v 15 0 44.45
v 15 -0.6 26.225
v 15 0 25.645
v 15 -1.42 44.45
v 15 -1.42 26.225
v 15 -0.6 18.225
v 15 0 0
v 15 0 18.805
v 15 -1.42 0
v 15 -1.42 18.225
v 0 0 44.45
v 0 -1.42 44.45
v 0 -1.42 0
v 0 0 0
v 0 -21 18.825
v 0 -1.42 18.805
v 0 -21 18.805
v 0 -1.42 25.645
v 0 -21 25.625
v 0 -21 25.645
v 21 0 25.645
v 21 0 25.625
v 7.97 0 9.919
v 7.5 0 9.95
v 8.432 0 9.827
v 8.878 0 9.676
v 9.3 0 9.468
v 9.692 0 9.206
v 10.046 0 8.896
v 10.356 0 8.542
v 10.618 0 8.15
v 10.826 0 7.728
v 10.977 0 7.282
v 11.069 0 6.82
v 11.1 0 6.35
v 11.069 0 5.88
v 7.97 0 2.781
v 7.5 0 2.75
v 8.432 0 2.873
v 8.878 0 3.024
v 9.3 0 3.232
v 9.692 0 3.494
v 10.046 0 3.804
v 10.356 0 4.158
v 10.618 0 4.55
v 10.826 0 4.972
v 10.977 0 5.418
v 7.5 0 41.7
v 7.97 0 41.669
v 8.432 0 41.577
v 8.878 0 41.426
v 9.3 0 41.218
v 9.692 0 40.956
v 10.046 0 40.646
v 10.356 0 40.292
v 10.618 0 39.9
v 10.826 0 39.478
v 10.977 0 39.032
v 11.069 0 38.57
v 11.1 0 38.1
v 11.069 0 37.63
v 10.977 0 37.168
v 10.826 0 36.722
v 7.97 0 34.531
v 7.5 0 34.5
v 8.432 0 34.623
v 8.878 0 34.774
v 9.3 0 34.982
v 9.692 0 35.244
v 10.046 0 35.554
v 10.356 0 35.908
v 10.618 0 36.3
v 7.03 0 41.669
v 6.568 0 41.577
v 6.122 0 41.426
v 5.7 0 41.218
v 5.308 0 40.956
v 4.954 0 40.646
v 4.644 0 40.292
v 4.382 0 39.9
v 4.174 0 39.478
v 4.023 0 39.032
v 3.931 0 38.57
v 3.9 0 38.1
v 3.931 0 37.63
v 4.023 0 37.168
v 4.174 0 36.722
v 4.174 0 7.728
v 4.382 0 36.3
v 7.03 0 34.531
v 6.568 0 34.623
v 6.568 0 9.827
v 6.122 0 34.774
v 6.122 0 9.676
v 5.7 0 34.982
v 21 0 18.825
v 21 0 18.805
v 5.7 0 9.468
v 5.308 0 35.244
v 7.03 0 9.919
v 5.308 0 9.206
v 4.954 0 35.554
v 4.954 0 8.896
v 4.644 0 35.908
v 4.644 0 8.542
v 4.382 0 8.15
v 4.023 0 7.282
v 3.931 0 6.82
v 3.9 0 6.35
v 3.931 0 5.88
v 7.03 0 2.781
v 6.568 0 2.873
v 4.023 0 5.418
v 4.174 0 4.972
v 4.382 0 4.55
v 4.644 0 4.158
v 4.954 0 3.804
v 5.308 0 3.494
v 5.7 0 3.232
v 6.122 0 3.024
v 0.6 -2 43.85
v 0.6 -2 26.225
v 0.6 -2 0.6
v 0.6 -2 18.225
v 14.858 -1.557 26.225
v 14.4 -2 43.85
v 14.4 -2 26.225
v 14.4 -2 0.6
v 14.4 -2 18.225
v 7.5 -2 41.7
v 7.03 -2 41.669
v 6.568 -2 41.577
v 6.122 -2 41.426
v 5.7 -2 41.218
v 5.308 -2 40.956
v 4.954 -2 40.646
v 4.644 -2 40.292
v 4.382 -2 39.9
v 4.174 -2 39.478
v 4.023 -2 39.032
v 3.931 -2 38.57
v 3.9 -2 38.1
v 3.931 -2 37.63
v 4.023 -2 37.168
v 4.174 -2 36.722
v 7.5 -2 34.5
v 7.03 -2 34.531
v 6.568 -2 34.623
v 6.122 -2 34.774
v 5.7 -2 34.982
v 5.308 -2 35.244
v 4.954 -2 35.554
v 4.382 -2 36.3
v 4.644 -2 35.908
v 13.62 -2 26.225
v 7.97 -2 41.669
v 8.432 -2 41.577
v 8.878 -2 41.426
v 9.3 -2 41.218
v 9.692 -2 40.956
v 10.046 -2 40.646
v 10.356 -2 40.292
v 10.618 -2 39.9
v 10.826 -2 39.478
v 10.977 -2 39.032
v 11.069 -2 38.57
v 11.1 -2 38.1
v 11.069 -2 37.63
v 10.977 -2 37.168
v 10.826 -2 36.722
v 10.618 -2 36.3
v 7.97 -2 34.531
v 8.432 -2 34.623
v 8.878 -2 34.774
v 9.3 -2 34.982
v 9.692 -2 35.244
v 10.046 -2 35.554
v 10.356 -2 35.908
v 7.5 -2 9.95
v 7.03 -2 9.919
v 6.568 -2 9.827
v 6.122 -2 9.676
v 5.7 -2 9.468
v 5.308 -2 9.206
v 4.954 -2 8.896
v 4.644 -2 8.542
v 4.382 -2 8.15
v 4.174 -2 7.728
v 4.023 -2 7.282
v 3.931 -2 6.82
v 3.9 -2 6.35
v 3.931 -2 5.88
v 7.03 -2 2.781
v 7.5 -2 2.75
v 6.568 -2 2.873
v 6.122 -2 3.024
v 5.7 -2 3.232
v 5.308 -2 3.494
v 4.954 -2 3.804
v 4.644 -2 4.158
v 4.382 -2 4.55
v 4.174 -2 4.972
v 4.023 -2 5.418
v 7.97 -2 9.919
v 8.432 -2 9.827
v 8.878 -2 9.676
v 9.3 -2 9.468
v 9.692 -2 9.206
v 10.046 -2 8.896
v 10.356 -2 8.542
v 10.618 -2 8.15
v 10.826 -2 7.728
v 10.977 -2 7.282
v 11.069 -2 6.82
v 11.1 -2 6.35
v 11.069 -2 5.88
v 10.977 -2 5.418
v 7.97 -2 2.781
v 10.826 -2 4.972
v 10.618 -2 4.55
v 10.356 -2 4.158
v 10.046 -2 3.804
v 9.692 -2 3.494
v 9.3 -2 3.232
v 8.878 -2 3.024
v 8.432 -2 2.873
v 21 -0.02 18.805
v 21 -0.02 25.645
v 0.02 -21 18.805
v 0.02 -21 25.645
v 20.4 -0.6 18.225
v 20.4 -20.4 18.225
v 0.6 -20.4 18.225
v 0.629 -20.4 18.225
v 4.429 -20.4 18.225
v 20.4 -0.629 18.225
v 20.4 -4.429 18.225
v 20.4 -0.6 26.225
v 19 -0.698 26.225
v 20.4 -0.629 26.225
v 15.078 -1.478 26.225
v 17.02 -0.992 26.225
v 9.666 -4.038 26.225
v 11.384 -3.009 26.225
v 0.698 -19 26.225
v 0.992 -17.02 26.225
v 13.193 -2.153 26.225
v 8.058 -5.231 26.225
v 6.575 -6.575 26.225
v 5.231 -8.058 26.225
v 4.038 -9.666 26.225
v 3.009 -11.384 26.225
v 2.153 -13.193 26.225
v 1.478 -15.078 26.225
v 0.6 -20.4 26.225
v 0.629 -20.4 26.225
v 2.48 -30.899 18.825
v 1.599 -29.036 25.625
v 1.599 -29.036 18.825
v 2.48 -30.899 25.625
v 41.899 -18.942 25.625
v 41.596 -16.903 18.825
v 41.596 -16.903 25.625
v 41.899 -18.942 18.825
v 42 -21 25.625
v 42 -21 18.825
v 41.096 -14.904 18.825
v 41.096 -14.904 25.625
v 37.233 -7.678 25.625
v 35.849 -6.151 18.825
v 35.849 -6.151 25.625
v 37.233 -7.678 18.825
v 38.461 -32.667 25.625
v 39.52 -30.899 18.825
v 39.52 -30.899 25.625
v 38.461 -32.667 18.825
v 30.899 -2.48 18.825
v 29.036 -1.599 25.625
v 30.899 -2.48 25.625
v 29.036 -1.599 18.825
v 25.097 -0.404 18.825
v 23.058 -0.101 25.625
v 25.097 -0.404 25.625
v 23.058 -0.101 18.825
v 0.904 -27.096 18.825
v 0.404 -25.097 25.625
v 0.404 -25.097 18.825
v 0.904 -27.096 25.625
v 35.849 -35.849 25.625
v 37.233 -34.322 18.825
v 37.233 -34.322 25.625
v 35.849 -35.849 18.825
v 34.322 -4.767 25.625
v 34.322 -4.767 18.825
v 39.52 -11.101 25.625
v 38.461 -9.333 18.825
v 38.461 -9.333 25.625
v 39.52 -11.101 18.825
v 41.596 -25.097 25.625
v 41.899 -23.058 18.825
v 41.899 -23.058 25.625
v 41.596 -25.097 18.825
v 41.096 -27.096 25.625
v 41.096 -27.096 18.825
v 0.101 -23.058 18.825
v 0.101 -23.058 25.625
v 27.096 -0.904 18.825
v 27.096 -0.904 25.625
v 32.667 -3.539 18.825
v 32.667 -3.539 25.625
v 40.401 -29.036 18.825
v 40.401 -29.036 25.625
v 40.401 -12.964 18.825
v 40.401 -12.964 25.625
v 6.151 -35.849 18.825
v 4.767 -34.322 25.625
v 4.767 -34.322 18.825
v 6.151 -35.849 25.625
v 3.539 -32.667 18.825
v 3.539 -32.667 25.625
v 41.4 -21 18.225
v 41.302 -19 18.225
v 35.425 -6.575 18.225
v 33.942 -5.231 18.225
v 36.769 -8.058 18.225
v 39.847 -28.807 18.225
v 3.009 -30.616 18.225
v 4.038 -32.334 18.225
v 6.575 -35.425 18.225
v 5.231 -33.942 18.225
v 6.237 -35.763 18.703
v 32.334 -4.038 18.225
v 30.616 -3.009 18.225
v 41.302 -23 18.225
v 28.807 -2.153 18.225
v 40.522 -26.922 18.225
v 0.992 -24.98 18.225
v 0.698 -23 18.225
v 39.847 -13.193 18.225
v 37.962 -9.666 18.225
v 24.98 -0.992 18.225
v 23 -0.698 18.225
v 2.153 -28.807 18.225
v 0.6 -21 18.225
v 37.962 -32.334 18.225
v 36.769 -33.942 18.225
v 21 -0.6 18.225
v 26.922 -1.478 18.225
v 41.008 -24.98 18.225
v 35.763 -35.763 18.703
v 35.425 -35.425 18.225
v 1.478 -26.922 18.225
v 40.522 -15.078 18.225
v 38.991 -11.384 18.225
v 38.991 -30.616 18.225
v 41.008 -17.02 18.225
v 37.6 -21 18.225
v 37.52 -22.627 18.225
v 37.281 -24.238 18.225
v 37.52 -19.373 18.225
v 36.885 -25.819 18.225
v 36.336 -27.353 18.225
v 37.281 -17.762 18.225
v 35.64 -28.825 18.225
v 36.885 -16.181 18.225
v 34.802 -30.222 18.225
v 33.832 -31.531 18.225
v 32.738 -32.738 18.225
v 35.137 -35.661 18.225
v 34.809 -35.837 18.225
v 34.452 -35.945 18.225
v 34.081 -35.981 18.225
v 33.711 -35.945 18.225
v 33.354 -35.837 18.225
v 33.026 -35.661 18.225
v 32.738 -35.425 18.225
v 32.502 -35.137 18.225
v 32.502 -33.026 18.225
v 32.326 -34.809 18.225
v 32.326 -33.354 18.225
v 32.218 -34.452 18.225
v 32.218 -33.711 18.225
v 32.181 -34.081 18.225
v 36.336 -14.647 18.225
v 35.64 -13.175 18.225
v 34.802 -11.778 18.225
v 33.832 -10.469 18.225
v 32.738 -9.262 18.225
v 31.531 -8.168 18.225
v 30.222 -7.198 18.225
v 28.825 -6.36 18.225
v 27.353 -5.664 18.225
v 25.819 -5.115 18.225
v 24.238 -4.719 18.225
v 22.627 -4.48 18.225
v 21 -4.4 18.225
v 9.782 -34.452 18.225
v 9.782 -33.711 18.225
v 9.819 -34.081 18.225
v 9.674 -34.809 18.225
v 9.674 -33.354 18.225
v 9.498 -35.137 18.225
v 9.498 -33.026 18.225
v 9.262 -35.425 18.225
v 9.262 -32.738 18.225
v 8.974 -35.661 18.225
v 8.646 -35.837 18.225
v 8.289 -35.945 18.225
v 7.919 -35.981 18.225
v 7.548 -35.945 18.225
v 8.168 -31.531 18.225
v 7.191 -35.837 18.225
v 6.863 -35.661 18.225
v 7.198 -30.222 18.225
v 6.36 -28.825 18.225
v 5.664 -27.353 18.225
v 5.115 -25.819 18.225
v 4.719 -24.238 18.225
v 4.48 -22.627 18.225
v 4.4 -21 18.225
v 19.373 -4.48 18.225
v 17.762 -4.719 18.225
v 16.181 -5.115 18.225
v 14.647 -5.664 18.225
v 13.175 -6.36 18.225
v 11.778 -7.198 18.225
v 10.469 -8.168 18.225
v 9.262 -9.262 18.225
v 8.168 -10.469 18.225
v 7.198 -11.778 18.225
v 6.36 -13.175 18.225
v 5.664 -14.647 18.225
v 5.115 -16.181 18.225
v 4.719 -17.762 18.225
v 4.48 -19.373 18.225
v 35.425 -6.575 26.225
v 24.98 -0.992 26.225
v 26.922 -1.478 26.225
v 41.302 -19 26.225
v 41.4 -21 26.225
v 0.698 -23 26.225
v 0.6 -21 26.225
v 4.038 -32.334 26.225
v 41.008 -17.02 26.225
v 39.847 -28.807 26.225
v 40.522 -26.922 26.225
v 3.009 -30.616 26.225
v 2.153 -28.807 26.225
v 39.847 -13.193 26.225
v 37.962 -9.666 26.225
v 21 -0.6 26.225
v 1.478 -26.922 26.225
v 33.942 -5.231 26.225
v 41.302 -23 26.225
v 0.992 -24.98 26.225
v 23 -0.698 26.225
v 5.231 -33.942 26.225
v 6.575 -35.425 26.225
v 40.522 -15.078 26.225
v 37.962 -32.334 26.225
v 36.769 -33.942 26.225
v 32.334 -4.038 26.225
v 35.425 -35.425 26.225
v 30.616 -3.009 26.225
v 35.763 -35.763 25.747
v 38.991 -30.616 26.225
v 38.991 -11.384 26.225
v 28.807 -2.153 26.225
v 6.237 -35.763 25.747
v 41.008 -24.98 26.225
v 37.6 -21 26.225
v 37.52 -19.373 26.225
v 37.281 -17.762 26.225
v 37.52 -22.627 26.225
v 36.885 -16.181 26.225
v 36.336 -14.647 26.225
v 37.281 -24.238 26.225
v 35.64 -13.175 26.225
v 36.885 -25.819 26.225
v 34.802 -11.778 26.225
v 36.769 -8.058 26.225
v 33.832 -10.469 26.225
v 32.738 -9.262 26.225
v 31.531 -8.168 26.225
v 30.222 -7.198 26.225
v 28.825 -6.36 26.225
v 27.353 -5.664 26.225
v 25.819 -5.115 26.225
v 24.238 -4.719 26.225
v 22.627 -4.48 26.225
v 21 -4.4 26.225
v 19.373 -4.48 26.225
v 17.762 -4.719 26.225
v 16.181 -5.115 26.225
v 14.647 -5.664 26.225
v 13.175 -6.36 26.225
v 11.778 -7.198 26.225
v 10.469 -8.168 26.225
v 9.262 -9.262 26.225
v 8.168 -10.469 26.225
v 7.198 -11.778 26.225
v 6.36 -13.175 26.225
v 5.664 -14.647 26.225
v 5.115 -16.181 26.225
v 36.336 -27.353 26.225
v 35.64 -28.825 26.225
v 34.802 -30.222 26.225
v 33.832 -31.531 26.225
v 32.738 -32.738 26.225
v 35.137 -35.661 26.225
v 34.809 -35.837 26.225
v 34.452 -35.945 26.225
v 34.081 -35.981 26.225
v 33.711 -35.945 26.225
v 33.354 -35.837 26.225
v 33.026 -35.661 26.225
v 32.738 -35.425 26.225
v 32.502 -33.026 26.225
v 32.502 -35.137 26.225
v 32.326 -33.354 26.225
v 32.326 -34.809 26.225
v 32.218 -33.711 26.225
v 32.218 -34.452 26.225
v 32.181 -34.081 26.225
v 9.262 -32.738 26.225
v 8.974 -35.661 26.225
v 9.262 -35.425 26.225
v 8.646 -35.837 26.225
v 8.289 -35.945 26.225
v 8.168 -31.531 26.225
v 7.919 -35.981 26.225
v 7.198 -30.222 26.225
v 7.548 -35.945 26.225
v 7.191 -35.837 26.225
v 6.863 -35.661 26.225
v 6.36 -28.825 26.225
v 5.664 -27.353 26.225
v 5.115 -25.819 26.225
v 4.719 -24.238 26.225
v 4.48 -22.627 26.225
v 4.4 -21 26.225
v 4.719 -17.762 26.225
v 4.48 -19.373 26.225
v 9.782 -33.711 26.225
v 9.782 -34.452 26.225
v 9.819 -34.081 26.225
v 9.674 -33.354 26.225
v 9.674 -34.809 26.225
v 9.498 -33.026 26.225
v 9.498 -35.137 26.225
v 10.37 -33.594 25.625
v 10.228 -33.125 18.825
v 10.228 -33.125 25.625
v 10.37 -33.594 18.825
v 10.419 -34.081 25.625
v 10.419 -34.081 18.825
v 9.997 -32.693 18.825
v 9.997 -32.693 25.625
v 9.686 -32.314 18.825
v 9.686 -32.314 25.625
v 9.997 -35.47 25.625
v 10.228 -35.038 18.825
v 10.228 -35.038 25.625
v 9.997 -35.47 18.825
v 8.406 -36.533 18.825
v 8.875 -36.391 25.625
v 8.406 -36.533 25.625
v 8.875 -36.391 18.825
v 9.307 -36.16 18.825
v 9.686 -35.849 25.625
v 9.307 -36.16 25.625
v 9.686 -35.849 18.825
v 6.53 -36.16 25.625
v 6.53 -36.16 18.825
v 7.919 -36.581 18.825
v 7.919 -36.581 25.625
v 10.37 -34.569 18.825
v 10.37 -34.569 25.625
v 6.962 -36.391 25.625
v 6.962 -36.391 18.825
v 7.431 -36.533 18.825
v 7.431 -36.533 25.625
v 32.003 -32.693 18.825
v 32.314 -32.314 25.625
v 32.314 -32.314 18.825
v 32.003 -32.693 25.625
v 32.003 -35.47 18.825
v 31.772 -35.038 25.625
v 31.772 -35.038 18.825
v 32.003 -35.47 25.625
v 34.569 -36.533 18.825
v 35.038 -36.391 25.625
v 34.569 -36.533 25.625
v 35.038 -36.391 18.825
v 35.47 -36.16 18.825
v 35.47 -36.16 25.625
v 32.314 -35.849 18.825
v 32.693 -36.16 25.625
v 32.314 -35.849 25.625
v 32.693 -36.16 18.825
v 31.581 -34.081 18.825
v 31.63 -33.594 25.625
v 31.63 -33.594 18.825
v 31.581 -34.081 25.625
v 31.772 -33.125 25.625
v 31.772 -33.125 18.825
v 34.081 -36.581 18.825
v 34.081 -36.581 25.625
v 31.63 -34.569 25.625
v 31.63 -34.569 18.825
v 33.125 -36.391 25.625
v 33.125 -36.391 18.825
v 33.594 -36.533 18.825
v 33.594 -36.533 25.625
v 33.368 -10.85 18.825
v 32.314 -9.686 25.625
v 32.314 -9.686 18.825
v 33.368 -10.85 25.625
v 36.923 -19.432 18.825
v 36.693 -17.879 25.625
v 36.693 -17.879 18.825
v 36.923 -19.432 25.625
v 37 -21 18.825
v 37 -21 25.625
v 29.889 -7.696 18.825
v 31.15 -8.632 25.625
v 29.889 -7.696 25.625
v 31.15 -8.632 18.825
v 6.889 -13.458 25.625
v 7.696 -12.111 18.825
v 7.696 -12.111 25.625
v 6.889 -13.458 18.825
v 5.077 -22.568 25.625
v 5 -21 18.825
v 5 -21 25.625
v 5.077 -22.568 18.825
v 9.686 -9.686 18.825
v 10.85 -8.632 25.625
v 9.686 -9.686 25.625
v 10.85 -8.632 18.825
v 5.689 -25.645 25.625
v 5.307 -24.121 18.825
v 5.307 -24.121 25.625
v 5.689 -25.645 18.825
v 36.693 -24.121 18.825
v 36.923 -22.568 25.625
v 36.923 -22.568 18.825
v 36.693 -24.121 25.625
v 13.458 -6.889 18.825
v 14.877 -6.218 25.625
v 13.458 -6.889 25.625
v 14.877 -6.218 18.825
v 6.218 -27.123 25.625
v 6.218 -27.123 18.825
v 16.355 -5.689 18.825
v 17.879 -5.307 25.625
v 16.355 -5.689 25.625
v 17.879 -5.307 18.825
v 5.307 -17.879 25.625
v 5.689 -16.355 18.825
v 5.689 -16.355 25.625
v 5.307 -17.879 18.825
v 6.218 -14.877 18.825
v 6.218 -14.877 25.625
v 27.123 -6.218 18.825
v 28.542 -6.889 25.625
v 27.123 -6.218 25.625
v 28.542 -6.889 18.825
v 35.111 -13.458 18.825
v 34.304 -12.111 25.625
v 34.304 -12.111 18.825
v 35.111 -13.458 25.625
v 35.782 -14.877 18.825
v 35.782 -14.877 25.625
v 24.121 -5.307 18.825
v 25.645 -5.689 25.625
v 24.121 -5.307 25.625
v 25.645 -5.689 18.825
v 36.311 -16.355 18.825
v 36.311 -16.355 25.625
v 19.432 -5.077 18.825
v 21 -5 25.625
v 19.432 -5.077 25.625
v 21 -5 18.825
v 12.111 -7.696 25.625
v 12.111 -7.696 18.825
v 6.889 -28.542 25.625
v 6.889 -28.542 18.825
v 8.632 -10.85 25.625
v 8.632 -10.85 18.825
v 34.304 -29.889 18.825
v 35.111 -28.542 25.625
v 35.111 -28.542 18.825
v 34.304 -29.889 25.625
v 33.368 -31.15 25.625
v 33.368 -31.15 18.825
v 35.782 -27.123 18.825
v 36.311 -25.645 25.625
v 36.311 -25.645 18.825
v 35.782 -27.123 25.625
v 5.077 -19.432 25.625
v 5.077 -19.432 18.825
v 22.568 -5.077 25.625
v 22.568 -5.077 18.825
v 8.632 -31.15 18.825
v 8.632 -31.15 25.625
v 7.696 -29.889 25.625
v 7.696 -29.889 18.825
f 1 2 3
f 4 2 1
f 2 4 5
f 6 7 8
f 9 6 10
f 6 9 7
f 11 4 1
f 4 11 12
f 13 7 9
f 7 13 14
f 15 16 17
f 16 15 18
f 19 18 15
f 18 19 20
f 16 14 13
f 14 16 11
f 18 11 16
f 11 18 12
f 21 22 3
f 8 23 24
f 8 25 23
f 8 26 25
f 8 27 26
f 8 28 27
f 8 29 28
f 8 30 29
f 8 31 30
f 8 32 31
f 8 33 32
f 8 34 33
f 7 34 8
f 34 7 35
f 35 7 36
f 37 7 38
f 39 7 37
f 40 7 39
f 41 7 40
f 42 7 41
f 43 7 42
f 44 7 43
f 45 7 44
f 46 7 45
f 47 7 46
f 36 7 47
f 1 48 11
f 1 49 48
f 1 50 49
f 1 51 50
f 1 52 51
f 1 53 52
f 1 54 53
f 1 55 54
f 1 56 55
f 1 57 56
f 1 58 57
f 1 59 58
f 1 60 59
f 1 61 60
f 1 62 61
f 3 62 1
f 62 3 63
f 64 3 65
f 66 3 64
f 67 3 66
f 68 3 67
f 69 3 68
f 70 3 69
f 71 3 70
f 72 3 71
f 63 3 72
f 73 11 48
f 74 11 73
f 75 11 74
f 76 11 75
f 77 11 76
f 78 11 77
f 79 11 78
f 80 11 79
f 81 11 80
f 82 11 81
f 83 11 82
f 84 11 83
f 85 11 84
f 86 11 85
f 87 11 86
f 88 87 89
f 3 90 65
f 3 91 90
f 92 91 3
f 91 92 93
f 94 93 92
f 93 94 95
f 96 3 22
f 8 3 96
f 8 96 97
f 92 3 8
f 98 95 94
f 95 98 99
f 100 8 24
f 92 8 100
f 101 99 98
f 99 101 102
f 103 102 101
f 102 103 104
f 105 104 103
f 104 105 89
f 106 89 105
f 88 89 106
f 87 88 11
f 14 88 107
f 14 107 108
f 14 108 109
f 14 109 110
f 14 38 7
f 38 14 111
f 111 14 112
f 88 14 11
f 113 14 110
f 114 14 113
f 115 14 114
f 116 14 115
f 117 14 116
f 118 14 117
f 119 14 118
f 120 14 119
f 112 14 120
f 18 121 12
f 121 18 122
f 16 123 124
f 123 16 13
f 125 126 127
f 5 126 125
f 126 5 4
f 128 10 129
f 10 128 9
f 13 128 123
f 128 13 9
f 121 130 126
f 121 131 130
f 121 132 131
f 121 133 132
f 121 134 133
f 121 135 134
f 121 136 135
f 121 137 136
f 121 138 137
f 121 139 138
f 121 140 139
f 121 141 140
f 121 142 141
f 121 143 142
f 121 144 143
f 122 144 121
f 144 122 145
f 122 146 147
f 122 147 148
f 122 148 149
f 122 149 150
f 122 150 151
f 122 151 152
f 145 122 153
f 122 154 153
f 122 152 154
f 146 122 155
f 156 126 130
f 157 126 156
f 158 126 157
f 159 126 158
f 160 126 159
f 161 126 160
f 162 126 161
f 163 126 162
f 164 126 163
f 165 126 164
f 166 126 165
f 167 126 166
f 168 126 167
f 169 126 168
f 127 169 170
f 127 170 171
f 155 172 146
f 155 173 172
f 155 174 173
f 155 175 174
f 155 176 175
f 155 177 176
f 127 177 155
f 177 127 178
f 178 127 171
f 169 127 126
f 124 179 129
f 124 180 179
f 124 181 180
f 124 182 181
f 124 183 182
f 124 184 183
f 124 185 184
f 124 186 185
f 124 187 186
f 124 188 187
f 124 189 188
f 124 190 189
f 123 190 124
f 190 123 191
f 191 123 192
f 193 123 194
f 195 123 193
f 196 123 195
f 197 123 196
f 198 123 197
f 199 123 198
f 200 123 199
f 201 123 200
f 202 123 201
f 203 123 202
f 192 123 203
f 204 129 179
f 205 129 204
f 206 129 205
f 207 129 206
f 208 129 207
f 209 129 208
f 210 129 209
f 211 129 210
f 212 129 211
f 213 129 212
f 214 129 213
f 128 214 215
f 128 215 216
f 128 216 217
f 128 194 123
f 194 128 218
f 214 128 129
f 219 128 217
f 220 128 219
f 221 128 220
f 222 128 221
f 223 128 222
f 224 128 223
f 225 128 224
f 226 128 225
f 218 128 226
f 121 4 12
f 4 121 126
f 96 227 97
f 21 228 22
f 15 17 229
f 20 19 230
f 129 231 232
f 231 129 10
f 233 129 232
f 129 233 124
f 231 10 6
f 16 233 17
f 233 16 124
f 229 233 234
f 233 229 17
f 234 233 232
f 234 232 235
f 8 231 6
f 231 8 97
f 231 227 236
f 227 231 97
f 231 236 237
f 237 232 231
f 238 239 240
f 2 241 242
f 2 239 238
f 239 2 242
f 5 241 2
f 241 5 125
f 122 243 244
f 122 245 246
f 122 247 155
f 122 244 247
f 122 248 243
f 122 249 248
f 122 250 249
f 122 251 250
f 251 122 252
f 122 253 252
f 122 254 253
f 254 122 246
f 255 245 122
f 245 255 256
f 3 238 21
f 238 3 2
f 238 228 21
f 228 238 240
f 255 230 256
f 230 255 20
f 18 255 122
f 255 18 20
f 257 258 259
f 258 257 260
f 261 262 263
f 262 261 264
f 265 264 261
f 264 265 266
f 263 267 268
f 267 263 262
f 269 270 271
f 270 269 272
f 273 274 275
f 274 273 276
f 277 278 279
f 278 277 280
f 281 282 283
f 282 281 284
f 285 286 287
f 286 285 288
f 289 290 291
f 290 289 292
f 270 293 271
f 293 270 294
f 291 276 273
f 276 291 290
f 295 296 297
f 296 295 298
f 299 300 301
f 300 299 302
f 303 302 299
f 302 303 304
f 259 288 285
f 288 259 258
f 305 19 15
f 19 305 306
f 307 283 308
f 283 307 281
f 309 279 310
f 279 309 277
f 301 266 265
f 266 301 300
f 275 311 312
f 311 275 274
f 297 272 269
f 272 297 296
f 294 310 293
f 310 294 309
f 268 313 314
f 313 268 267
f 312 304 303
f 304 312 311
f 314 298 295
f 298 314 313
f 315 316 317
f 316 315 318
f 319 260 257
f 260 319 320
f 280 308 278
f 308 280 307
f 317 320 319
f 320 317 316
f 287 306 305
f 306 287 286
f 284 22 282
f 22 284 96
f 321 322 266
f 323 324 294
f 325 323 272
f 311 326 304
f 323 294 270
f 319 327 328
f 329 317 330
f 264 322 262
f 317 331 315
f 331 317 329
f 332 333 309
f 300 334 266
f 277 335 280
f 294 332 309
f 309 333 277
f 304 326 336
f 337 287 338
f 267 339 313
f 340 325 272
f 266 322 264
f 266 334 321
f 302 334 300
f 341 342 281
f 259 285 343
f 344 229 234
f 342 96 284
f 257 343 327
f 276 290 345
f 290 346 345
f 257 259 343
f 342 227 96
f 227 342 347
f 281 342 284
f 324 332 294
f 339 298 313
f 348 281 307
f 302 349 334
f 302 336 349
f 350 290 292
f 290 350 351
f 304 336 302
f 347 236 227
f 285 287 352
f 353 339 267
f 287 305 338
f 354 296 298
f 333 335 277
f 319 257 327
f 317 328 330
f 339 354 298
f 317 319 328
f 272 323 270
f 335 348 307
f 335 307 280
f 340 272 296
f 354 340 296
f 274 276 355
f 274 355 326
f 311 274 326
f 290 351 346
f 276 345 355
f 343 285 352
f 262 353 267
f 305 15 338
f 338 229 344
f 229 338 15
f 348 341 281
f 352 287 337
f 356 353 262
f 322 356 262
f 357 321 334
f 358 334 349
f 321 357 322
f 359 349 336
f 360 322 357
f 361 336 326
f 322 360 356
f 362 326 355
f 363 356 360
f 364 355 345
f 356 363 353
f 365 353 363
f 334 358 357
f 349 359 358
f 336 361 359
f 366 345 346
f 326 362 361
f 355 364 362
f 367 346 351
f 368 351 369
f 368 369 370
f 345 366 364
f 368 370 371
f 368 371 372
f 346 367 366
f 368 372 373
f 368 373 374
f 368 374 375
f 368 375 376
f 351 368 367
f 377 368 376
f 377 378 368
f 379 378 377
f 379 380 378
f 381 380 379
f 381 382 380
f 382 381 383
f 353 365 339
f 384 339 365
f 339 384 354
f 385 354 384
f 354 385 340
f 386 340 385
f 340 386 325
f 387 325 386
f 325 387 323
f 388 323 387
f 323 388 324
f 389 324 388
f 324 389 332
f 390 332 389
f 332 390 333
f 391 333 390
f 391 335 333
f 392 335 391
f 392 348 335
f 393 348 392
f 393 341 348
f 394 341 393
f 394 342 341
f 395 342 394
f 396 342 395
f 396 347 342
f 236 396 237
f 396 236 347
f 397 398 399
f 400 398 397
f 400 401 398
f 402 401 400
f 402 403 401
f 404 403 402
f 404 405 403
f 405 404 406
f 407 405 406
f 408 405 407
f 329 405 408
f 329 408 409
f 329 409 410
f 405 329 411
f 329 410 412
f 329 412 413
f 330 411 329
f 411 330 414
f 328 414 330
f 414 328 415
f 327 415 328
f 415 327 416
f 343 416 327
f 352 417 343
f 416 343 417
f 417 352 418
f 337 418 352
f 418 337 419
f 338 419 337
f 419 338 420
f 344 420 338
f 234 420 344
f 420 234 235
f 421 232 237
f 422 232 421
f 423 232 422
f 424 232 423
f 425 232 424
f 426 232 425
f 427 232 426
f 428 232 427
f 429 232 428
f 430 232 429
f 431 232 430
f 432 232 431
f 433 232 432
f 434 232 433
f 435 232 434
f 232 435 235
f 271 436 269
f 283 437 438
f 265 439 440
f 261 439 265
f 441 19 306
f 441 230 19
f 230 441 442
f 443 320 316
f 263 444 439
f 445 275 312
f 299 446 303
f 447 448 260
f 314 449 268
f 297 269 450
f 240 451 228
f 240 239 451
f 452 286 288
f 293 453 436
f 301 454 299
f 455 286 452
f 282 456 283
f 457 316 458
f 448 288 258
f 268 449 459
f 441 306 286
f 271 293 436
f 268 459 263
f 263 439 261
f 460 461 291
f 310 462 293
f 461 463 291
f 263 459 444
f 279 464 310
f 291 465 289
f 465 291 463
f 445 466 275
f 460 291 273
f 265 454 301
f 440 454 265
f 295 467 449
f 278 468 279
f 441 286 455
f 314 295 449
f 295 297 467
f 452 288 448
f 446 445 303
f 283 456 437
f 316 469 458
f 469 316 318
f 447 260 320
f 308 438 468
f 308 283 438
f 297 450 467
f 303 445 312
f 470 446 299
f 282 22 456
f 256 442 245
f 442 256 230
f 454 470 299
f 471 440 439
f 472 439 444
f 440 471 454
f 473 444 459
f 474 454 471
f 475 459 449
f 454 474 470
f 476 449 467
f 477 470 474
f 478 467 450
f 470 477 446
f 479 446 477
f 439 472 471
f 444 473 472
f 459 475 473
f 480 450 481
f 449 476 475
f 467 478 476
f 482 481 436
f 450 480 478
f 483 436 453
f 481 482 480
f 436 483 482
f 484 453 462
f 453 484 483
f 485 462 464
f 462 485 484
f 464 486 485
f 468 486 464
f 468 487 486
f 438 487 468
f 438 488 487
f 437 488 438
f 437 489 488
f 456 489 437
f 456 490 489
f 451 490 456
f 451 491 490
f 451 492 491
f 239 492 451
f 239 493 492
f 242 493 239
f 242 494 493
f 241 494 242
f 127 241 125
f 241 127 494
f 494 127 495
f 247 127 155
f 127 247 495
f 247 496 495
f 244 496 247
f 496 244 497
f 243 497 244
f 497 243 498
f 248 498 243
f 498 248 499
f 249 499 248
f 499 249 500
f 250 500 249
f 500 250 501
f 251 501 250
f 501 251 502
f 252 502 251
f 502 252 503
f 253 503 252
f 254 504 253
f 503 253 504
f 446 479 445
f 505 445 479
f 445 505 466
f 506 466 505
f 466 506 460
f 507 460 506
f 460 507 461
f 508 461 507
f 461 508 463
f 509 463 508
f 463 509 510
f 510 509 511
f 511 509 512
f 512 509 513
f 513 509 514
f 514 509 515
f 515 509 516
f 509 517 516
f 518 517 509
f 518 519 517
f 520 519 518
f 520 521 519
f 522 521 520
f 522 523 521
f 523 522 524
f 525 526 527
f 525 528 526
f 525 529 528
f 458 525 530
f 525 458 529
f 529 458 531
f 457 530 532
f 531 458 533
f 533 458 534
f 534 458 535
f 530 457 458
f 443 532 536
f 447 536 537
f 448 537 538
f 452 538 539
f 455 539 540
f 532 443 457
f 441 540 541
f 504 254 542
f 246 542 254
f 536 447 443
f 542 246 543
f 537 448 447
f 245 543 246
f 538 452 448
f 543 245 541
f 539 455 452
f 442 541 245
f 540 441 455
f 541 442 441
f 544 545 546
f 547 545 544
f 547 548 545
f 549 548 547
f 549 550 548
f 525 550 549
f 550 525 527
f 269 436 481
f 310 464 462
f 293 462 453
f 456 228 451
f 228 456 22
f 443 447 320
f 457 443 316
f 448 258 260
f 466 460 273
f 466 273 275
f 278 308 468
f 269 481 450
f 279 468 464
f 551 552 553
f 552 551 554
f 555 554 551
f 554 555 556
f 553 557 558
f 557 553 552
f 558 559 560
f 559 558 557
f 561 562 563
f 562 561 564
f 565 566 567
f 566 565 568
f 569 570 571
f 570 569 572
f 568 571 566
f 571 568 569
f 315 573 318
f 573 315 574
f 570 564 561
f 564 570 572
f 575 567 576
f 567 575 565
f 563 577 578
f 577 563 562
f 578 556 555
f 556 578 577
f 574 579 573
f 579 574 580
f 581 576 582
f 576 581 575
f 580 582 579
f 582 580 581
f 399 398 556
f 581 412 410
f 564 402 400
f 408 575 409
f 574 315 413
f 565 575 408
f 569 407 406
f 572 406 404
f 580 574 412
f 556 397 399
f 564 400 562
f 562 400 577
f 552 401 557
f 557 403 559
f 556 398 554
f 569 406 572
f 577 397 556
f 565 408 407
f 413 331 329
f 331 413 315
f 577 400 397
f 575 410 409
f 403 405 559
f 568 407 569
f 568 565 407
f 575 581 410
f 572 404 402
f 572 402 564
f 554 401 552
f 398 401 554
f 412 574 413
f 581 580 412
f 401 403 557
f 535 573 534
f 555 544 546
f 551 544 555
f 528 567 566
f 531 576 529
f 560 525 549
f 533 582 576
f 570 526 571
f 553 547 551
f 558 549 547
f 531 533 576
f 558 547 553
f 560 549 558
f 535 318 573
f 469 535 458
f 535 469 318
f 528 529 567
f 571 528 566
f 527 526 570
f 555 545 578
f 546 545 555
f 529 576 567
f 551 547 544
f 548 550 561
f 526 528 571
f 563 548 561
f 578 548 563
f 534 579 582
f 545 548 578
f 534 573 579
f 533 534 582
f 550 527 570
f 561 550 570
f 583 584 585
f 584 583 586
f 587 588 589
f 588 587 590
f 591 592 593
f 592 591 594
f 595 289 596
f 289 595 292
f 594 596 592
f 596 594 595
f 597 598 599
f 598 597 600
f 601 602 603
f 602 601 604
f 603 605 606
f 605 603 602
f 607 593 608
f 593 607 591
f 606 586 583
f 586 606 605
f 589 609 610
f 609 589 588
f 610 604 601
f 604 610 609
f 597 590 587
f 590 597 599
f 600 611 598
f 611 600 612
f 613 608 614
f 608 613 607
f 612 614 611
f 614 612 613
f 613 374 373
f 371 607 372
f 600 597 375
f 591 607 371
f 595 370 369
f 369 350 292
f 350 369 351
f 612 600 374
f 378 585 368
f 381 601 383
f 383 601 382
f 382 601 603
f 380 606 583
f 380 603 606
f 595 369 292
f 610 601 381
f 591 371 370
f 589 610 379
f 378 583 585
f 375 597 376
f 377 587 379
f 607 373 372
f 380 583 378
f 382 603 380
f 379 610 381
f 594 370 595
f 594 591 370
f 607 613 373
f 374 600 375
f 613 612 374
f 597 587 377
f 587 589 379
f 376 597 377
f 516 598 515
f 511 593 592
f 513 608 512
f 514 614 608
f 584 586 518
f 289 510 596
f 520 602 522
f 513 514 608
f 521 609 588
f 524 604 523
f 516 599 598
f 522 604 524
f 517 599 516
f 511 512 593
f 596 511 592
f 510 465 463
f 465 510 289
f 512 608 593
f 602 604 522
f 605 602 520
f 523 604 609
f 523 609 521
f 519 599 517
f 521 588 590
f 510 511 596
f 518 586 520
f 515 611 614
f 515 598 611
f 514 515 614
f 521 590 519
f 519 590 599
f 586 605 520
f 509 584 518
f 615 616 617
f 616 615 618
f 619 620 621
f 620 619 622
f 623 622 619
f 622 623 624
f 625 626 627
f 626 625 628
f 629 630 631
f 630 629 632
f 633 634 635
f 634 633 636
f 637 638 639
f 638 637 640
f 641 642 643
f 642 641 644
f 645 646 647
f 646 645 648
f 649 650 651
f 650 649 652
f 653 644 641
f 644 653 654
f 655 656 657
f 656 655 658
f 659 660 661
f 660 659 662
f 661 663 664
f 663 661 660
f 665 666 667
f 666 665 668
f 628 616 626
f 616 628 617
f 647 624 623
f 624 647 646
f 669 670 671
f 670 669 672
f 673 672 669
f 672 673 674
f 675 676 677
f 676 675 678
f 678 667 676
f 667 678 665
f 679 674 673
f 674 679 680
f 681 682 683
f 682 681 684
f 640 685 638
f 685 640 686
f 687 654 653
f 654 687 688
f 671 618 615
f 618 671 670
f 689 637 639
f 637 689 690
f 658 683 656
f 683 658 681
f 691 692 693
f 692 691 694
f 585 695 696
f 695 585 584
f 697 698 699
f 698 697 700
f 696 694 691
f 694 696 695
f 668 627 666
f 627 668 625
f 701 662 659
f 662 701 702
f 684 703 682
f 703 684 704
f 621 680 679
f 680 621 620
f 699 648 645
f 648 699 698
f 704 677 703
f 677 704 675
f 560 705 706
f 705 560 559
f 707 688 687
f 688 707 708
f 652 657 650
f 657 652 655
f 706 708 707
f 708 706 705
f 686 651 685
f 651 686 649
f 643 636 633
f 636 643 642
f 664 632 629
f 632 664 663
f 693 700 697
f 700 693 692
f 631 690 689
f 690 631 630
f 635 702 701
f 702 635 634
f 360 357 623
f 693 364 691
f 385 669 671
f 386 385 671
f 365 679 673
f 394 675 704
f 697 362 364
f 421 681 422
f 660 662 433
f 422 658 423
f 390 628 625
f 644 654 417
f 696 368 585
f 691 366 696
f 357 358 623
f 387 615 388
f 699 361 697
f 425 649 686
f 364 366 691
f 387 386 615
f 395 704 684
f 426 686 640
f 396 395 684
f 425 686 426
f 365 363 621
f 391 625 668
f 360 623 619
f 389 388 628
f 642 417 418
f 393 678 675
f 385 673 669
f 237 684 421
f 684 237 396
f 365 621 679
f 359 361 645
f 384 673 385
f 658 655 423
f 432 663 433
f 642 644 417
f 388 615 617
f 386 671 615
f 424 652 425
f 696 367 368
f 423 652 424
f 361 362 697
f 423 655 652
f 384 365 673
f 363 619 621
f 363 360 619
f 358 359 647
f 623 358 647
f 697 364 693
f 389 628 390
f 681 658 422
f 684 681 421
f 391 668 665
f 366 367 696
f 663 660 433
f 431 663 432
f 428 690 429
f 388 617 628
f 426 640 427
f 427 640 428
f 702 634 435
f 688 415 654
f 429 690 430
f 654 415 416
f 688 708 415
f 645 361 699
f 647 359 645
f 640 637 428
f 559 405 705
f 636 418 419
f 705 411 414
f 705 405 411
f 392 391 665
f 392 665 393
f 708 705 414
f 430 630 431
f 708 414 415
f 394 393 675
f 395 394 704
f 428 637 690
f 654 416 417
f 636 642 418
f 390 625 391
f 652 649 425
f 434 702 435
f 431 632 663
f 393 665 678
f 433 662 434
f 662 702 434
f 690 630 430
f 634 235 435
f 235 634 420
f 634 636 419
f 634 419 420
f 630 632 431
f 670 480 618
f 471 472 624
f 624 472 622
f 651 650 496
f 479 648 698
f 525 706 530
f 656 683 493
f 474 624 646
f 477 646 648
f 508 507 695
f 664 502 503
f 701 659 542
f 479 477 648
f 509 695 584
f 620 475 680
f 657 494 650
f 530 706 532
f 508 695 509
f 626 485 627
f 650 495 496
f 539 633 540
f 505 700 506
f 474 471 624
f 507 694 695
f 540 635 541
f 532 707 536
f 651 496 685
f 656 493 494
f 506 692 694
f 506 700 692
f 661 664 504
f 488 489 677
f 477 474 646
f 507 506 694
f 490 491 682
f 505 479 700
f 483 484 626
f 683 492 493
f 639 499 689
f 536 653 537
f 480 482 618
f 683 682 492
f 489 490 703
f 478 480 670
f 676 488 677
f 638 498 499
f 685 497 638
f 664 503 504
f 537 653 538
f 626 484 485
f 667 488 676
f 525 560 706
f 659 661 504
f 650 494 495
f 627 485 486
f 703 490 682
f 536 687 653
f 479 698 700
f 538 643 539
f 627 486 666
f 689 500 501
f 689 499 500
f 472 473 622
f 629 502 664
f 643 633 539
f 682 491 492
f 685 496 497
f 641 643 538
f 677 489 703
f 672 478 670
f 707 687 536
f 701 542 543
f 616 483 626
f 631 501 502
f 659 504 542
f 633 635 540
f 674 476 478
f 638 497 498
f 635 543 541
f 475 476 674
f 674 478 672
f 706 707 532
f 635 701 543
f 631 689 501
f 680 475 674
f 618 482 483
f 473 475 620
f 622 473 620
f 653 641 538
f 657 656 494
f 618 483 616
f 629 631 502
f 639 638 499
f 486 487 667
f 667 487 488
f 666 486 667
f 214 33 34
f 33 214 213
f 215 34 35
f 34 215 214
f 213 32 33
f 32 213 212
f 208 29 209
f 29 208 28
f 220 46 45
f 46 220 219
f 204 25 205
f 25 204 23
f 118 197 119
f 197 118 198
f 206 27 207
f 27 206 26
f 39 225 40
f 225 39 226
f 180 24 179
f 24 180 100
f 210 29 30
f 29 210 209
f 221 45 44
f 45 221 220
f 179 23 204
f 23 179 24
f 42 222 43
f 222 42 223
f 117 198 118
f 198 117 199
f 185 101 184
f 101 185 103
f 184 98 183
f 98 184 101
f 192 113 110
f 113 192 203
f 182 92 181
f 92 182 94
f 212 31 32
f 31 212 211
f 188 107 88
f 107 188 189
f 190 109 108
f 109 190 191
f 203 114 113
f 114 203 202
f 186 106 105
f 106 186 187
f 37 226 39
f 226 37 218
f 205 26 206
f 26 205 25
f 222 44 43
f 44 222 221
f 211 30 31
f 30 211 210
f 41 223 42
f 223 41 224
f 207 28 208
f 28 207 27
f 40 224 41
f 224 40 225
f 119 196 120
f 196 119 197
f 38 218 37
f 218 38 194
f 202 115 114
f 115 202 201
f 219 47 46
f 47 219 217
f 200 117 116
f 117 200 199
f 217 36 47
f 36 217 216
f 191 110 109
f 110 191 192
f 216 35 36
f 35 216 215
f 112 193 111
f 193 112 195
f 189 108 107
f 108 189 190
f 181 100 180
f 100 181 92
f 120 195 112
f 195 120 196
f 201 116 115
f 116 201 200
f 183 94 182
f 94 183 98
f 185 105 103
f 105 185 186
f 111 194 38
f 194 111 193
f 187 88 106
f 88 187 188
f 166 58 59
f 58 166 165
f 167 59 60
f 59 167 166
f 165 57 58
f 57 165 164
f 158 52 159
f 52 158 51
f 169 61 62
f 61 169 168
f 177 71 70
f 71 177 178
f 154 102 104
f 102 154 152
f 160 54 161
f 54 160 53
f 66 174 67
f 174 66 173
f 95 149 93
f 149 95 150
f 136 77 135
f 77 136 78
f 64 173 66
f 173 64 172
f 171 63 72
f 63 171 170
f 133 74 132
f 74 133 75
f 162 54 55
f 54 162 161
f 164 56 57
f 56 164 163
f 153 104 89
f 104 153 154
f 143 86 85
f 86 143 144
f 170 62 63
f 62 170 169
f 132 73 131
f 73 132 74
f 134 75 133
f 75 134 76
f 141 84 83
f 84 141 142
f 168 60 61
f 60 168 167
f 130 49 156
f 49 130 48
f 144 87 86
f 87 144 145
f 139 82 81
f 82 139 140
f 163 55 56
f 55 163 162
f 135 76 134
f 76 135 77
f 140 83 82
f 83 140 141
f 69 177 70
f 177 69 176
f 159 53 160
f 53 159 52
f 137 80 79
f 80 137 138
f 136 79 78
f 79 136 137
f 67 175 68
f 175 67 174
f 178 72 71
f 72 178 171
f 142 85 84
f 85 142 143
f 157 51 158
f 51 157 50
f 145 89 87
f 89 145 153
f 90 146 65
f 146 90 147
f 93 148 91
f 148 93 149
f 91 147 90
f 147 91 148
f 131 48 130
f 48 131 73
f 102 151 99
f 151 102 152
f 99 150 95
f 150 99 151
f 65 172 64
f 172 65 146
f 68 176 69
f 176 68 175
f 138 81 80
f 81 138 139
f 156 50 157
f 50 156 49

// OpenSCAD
/**
 * Single-side 19" rack mounting plate: 1U tall, two holes (outer holes of the
 * standard EIA-310 three-hole group — middle hole omitted).
 *
 * Datum: plate bottom (Z = 0) aligns with the rack U boundary below this slot
 * (center of the 1/2" gap between hole groups). Plate top is the U boundary
 * above. Height and hole Z positions are fixed per EIA-310 (not parametric).
 * Plate width, thickness, hole size, and holder dimensions are parametric.
 *
 * Axes: X = along the ear (horizontal), Y = plate normal (Y = 0 is the outer stack
 *       plane; plate, tab, and ring lie in Y ≤ 0), Z = vertical (EIA rack height).
 *       X = 0 is the rail contact plane; geometry is symmetric in X (no handedness).
 *
 * Mic holder: hollow cylinder, axis +Z (vertical bore). Outer ring can have a wedge
 * removed (apex at holder centre, opening along −Y), with chamfered cylinders on the jaw
 * tips (tip Ø = half the outer−inner difference, i.e. radial wall). Bodies use
 * chamfered_cylinder (barrel h − 2×chamfer + end cones). Inner/outer are full Ø;
 * holder_thickness is the vertical grip length (Z). Ring lies in Y ≤ 0 (outer tangent
 * to Y = 0). Rail-side alignment: min X of ring and plate both at
 * X = 0. Z centered between the two rack mounting holes.
 *
 * Tab: square in XY (holder_outer_d/2 × holder_outer_d/2), Z = holder_thickness;
 * Y from −holder_outer_d/2 … 0 (face on Y = 0), anchored at X = 0. Unioned with the outer
 * ring; inner bore subtracted from that union.
 *
 * Plate chamfer: main slab shortened in Y by chamfer, then hull frustum unioned on the −Y
 * face (same pattern as tab / ring: thin body + added bevel solid).
 */

// --- Parametric (user) ---
plate_width = 15;       // mm, horizontal extent (single rail side)
plate_thickness = 2;    // mm
mounting_hole_d = 7.2;  // mm, typical for M6/cage-nut clearance (adjust to rail)
chamfer = 0.6;          // mm, 45° bevel on plate −Y face rim (see chamfer module)

// Mic grip (diameters = full Ø; thickness = vertical length along Z / bore axis)
holder_inner_d = 32;
holder_outer_d = 42;
holder_thickness = 8;
// Wedge removed from outer ring only: apex at holder centre, symmetric about −Y (full angle, deg).
mic_wedge_deg = 90;

// --- EIA-310 vertical: not parametric ---
// 1U = 1.75 in
function u_height_mm() = 44.45;
// Within one U, hole centers are 5/8" + 5/8" + 1/2" apart on center (bottom→top).
// U boundary lies in the middle of each 1/2" gap, so first and third hole centers
// sit 1/4" above the lower gap center and 1/4" below the upper gap center.
function hole_bottom_z_mm() = 6.35;   // 12.7 / 2
function hole_top_z_mm() = 38.1;    // 6.35 + 15.875 + 15.875

// Positive solid: hull of inset X–Z face at Y = −t (outer back) and full face at Y = −t + c (joins thinned slab).
module plate_back_face_chamfer_frustum(w, t, hh, c) {
  eps_y = 0.02;
  assert(c > 0);
  assert(c < t, "chamfer must be less than plate thickness");
  assert(w > 2 * c && hh > 2 * c, "chamfer inset needs w and hh greater than 2 * chamfer");

  // Large slab at join (y = −t + c, with thinned core); small at outer back (y = −t) — same
  // sense as tab top chamfer (large at join, small at tip) with +Y = “into” the plate.
  hull() {
    translate([c, -t, c])
      cube([w - 2 * c, eps_y, hh - 2 * c]);
    translate([0, -t + c - eps_y, 0])
      cube([w, eps_y, hh]);
  }
}

// Vertical cylinder on +Z, centered: main barrel height (h − 2×ch) plus truncated cones (ch each).
// outer=true: outer lip (r grows toward ends). outer=false: bore-positive solid (inner flare).
module chamfered_cylinder(d, h, ch, outer = true, fn = 64) {
  R = d / 2;
  assert(ch > 0 && ch < h / 2, "chamfer must be in (0, h/2)");
  if (outer)
    assert(ch < R, "outer chamfer must be less than radius");
  union() {
    cylinder(h = h - 2 * ch, d = d, center = true, $fn = fn);
    translate([0, 0, -h / 2])
      cylinder(h = ch, r1 = outer ? R - ch : R + ch, r2 = R, $fn = fn);
    translate([0, 0, h / 2 - ch])
      cylinder(h = ch, r1 = R, r2 = outer ? R - ch : R + ch, $fn = fn);
  }
}

// Apex at origin; pie symmetric about −Y; extruded along Z (holder local frame after translate).
// r_far: use a full outer diameter from the apex so the triangular wedge reliably clears the ring.
module mic_holder_centre_neg_y_wedge_remove(gap_deg, r_far, h) {
  rotate([0, 0, -90 - gap_deg / 2])
    linear_extrude(height = h, center = true)
      polygon([[0, 0], [r_far, 0], [r_far * cos(gap_deg), r_far * sin(gap_deg)]]);
}

module mic_holder_ring() {
  assert(holder_outer_d > holder_inner_d, "holder_outer_d must exceed holder_inner_d");
  assert(holder_inner_d > 0 && holder_thickness > 0);
  assert(chamfer > 0 && chamfer < holder_thickness / 2, "chamfer must be less than half holder_thickness");
  assert(chamfer < holder_outer_d / 2, "chamfer must be less than outer radius for ring chamfer cones");
  assert(holder_inner_d / 2 + chamfer < holder_outer_d / 2, "inner chamfer cones must stay inside outer ring wall");
  assert(holder_outer_d > 4 * chamfer, "tab chamfer needs holder_outer_d > 4 * chamfer (square inset)");
  assert(mic_wedge_deg > 0 && mic_wedge_deg < 179, "mic_wedge_deg must be in (0, 179) for finite wedge");
  assert(chamfer < (holder_outer_d - holder_inner_d) / 4,
    "chamfer must be less than half the tip radius (tip Ø is half of outer−inner difference)");

  zb = hole_bottom_z_mm();
  zt = hole_top_z_mm();
  z_center = (zb + zt) / 2;
  // Outer disk in XY; min X = 0 aligns with plate rail-side edge.
  x_center = holder_outer_d / 2;
  // Ring in Y ≤ 0; outer circle tangent to the Y = 0 plane (same as plate/tab face).
  y_center = -holder_outer_d / 2;

  h_plate = u_height_mm();
  z_tab = h_plate / 2 - holder_thickness / 2;

  R_outer = holder_outer_d / 2;
  R_inner = holder_inner_d / 2;
  R_wall_mid = (R_inner + R_outer) / 2; // claw tips sit mid-wall, not on outer rim
  claw_tip_d = (holder_outer_d - holder_inner_d) / 2; // Ø = radial wall (diameter diff is split)
  H = holder_thickness;
  c = chamfer;

  a_tab = holder_outer_d / 2;
  z0_tab = z_tab;
  eps_tab = 0.02;

  difference() {
    union() {
      // Tab: main block shortened in Z + square frustums (45° bevel on top and bottom faces).
      union() {
        translate([0, -a_tab, z0_tab + c])
          cube([a_tab, a_tab, H - 2 * c]);
        // Bottom bevel: large at join (z0_tab + c), small at outer tip (z0_tab) — same sense as top.
        hull() {
          translate([c, -a_tab + c, z0_tab])
            linear_extrude(eps_tab) square(a_tab - 2 * c);
          translate([0, -a_tab, z0_tab + c - eps_tab])
            linear_extrude(eps_tab) square(a_tab);
        }
        hull() {
          translate([0, -a_tab, z0_tab + H - c])
            linear_extrude(eps_tab) square(a_tab);
          // linear_extrude goes +Z; end top slice at z0_tab + H, not above it.
          translate([c, -a_tab + c, z0_tab + H - eps_tab])
            linear_extrude(eps_tab) square(a_tab - 2 * c);
        }
      }
      // Outer claw: chamfered cylinder minus wedge, plus chamfered tips on the jaw edges.
      translate([x_center, y_center, z_center]) {
        r_wedge = holder_outer_d;
        union() {
          difference() {
            chamfered_cylinder(holder_outer_d, H, c, outer = true, fn = 64);
            mic_holder_centre_neg_y_wedge_remove(mic_wedge_deg, r_wedge, H + 0.2);
          }
          // Wedge is symmetric about −Y; jaw edges at −90° ± half angle (not +Y).
          for (a = [-90 - mic_wedge_deg / 2, -90 + mic_wedge_deg / 2])
            translate([R_wall_mid * cos(a), R_wall_mid * sin(a), 0])
              chamfered_cylinder(claw_tip_d, H, c, outer = true, fn = 32);
        }
      }
    }
    // Bore: chamfered inner solid (subtract; flares wider at top/bottom).
    translate([x_center, y_center, z_center])
      chamfered_cylinder(holder_inner_d, H, c, outer = false, fn = 64);
  }
}

module rack_1u_two_hole_plate() {
  h = u_height_mm();
  z1 = hole_bottom_z_mm();
  z2 = hole_top_z_mm();

  difference() {
    union() {
      union() {
        translate([0, -plate_thickness + chamfer, 0])
          cube([plate_width, plate_thickness - chamfer, h]);
        plate_back_face_chamfer_frustum(plate_width, plate_thickness, h, chamfer);
      }
      mic_holder_ring();
    }
    for (z = [z1, z2])
      translate([plate_width / 2, -plate_thickness / 2, z])
        rotate([90, 0, 0])
          cylinder(d = mounting_hole_d, h = plate_thickness + 0.02, center = true, $fn = 48);
  }
}

rack_1u_two_hole_plate();
